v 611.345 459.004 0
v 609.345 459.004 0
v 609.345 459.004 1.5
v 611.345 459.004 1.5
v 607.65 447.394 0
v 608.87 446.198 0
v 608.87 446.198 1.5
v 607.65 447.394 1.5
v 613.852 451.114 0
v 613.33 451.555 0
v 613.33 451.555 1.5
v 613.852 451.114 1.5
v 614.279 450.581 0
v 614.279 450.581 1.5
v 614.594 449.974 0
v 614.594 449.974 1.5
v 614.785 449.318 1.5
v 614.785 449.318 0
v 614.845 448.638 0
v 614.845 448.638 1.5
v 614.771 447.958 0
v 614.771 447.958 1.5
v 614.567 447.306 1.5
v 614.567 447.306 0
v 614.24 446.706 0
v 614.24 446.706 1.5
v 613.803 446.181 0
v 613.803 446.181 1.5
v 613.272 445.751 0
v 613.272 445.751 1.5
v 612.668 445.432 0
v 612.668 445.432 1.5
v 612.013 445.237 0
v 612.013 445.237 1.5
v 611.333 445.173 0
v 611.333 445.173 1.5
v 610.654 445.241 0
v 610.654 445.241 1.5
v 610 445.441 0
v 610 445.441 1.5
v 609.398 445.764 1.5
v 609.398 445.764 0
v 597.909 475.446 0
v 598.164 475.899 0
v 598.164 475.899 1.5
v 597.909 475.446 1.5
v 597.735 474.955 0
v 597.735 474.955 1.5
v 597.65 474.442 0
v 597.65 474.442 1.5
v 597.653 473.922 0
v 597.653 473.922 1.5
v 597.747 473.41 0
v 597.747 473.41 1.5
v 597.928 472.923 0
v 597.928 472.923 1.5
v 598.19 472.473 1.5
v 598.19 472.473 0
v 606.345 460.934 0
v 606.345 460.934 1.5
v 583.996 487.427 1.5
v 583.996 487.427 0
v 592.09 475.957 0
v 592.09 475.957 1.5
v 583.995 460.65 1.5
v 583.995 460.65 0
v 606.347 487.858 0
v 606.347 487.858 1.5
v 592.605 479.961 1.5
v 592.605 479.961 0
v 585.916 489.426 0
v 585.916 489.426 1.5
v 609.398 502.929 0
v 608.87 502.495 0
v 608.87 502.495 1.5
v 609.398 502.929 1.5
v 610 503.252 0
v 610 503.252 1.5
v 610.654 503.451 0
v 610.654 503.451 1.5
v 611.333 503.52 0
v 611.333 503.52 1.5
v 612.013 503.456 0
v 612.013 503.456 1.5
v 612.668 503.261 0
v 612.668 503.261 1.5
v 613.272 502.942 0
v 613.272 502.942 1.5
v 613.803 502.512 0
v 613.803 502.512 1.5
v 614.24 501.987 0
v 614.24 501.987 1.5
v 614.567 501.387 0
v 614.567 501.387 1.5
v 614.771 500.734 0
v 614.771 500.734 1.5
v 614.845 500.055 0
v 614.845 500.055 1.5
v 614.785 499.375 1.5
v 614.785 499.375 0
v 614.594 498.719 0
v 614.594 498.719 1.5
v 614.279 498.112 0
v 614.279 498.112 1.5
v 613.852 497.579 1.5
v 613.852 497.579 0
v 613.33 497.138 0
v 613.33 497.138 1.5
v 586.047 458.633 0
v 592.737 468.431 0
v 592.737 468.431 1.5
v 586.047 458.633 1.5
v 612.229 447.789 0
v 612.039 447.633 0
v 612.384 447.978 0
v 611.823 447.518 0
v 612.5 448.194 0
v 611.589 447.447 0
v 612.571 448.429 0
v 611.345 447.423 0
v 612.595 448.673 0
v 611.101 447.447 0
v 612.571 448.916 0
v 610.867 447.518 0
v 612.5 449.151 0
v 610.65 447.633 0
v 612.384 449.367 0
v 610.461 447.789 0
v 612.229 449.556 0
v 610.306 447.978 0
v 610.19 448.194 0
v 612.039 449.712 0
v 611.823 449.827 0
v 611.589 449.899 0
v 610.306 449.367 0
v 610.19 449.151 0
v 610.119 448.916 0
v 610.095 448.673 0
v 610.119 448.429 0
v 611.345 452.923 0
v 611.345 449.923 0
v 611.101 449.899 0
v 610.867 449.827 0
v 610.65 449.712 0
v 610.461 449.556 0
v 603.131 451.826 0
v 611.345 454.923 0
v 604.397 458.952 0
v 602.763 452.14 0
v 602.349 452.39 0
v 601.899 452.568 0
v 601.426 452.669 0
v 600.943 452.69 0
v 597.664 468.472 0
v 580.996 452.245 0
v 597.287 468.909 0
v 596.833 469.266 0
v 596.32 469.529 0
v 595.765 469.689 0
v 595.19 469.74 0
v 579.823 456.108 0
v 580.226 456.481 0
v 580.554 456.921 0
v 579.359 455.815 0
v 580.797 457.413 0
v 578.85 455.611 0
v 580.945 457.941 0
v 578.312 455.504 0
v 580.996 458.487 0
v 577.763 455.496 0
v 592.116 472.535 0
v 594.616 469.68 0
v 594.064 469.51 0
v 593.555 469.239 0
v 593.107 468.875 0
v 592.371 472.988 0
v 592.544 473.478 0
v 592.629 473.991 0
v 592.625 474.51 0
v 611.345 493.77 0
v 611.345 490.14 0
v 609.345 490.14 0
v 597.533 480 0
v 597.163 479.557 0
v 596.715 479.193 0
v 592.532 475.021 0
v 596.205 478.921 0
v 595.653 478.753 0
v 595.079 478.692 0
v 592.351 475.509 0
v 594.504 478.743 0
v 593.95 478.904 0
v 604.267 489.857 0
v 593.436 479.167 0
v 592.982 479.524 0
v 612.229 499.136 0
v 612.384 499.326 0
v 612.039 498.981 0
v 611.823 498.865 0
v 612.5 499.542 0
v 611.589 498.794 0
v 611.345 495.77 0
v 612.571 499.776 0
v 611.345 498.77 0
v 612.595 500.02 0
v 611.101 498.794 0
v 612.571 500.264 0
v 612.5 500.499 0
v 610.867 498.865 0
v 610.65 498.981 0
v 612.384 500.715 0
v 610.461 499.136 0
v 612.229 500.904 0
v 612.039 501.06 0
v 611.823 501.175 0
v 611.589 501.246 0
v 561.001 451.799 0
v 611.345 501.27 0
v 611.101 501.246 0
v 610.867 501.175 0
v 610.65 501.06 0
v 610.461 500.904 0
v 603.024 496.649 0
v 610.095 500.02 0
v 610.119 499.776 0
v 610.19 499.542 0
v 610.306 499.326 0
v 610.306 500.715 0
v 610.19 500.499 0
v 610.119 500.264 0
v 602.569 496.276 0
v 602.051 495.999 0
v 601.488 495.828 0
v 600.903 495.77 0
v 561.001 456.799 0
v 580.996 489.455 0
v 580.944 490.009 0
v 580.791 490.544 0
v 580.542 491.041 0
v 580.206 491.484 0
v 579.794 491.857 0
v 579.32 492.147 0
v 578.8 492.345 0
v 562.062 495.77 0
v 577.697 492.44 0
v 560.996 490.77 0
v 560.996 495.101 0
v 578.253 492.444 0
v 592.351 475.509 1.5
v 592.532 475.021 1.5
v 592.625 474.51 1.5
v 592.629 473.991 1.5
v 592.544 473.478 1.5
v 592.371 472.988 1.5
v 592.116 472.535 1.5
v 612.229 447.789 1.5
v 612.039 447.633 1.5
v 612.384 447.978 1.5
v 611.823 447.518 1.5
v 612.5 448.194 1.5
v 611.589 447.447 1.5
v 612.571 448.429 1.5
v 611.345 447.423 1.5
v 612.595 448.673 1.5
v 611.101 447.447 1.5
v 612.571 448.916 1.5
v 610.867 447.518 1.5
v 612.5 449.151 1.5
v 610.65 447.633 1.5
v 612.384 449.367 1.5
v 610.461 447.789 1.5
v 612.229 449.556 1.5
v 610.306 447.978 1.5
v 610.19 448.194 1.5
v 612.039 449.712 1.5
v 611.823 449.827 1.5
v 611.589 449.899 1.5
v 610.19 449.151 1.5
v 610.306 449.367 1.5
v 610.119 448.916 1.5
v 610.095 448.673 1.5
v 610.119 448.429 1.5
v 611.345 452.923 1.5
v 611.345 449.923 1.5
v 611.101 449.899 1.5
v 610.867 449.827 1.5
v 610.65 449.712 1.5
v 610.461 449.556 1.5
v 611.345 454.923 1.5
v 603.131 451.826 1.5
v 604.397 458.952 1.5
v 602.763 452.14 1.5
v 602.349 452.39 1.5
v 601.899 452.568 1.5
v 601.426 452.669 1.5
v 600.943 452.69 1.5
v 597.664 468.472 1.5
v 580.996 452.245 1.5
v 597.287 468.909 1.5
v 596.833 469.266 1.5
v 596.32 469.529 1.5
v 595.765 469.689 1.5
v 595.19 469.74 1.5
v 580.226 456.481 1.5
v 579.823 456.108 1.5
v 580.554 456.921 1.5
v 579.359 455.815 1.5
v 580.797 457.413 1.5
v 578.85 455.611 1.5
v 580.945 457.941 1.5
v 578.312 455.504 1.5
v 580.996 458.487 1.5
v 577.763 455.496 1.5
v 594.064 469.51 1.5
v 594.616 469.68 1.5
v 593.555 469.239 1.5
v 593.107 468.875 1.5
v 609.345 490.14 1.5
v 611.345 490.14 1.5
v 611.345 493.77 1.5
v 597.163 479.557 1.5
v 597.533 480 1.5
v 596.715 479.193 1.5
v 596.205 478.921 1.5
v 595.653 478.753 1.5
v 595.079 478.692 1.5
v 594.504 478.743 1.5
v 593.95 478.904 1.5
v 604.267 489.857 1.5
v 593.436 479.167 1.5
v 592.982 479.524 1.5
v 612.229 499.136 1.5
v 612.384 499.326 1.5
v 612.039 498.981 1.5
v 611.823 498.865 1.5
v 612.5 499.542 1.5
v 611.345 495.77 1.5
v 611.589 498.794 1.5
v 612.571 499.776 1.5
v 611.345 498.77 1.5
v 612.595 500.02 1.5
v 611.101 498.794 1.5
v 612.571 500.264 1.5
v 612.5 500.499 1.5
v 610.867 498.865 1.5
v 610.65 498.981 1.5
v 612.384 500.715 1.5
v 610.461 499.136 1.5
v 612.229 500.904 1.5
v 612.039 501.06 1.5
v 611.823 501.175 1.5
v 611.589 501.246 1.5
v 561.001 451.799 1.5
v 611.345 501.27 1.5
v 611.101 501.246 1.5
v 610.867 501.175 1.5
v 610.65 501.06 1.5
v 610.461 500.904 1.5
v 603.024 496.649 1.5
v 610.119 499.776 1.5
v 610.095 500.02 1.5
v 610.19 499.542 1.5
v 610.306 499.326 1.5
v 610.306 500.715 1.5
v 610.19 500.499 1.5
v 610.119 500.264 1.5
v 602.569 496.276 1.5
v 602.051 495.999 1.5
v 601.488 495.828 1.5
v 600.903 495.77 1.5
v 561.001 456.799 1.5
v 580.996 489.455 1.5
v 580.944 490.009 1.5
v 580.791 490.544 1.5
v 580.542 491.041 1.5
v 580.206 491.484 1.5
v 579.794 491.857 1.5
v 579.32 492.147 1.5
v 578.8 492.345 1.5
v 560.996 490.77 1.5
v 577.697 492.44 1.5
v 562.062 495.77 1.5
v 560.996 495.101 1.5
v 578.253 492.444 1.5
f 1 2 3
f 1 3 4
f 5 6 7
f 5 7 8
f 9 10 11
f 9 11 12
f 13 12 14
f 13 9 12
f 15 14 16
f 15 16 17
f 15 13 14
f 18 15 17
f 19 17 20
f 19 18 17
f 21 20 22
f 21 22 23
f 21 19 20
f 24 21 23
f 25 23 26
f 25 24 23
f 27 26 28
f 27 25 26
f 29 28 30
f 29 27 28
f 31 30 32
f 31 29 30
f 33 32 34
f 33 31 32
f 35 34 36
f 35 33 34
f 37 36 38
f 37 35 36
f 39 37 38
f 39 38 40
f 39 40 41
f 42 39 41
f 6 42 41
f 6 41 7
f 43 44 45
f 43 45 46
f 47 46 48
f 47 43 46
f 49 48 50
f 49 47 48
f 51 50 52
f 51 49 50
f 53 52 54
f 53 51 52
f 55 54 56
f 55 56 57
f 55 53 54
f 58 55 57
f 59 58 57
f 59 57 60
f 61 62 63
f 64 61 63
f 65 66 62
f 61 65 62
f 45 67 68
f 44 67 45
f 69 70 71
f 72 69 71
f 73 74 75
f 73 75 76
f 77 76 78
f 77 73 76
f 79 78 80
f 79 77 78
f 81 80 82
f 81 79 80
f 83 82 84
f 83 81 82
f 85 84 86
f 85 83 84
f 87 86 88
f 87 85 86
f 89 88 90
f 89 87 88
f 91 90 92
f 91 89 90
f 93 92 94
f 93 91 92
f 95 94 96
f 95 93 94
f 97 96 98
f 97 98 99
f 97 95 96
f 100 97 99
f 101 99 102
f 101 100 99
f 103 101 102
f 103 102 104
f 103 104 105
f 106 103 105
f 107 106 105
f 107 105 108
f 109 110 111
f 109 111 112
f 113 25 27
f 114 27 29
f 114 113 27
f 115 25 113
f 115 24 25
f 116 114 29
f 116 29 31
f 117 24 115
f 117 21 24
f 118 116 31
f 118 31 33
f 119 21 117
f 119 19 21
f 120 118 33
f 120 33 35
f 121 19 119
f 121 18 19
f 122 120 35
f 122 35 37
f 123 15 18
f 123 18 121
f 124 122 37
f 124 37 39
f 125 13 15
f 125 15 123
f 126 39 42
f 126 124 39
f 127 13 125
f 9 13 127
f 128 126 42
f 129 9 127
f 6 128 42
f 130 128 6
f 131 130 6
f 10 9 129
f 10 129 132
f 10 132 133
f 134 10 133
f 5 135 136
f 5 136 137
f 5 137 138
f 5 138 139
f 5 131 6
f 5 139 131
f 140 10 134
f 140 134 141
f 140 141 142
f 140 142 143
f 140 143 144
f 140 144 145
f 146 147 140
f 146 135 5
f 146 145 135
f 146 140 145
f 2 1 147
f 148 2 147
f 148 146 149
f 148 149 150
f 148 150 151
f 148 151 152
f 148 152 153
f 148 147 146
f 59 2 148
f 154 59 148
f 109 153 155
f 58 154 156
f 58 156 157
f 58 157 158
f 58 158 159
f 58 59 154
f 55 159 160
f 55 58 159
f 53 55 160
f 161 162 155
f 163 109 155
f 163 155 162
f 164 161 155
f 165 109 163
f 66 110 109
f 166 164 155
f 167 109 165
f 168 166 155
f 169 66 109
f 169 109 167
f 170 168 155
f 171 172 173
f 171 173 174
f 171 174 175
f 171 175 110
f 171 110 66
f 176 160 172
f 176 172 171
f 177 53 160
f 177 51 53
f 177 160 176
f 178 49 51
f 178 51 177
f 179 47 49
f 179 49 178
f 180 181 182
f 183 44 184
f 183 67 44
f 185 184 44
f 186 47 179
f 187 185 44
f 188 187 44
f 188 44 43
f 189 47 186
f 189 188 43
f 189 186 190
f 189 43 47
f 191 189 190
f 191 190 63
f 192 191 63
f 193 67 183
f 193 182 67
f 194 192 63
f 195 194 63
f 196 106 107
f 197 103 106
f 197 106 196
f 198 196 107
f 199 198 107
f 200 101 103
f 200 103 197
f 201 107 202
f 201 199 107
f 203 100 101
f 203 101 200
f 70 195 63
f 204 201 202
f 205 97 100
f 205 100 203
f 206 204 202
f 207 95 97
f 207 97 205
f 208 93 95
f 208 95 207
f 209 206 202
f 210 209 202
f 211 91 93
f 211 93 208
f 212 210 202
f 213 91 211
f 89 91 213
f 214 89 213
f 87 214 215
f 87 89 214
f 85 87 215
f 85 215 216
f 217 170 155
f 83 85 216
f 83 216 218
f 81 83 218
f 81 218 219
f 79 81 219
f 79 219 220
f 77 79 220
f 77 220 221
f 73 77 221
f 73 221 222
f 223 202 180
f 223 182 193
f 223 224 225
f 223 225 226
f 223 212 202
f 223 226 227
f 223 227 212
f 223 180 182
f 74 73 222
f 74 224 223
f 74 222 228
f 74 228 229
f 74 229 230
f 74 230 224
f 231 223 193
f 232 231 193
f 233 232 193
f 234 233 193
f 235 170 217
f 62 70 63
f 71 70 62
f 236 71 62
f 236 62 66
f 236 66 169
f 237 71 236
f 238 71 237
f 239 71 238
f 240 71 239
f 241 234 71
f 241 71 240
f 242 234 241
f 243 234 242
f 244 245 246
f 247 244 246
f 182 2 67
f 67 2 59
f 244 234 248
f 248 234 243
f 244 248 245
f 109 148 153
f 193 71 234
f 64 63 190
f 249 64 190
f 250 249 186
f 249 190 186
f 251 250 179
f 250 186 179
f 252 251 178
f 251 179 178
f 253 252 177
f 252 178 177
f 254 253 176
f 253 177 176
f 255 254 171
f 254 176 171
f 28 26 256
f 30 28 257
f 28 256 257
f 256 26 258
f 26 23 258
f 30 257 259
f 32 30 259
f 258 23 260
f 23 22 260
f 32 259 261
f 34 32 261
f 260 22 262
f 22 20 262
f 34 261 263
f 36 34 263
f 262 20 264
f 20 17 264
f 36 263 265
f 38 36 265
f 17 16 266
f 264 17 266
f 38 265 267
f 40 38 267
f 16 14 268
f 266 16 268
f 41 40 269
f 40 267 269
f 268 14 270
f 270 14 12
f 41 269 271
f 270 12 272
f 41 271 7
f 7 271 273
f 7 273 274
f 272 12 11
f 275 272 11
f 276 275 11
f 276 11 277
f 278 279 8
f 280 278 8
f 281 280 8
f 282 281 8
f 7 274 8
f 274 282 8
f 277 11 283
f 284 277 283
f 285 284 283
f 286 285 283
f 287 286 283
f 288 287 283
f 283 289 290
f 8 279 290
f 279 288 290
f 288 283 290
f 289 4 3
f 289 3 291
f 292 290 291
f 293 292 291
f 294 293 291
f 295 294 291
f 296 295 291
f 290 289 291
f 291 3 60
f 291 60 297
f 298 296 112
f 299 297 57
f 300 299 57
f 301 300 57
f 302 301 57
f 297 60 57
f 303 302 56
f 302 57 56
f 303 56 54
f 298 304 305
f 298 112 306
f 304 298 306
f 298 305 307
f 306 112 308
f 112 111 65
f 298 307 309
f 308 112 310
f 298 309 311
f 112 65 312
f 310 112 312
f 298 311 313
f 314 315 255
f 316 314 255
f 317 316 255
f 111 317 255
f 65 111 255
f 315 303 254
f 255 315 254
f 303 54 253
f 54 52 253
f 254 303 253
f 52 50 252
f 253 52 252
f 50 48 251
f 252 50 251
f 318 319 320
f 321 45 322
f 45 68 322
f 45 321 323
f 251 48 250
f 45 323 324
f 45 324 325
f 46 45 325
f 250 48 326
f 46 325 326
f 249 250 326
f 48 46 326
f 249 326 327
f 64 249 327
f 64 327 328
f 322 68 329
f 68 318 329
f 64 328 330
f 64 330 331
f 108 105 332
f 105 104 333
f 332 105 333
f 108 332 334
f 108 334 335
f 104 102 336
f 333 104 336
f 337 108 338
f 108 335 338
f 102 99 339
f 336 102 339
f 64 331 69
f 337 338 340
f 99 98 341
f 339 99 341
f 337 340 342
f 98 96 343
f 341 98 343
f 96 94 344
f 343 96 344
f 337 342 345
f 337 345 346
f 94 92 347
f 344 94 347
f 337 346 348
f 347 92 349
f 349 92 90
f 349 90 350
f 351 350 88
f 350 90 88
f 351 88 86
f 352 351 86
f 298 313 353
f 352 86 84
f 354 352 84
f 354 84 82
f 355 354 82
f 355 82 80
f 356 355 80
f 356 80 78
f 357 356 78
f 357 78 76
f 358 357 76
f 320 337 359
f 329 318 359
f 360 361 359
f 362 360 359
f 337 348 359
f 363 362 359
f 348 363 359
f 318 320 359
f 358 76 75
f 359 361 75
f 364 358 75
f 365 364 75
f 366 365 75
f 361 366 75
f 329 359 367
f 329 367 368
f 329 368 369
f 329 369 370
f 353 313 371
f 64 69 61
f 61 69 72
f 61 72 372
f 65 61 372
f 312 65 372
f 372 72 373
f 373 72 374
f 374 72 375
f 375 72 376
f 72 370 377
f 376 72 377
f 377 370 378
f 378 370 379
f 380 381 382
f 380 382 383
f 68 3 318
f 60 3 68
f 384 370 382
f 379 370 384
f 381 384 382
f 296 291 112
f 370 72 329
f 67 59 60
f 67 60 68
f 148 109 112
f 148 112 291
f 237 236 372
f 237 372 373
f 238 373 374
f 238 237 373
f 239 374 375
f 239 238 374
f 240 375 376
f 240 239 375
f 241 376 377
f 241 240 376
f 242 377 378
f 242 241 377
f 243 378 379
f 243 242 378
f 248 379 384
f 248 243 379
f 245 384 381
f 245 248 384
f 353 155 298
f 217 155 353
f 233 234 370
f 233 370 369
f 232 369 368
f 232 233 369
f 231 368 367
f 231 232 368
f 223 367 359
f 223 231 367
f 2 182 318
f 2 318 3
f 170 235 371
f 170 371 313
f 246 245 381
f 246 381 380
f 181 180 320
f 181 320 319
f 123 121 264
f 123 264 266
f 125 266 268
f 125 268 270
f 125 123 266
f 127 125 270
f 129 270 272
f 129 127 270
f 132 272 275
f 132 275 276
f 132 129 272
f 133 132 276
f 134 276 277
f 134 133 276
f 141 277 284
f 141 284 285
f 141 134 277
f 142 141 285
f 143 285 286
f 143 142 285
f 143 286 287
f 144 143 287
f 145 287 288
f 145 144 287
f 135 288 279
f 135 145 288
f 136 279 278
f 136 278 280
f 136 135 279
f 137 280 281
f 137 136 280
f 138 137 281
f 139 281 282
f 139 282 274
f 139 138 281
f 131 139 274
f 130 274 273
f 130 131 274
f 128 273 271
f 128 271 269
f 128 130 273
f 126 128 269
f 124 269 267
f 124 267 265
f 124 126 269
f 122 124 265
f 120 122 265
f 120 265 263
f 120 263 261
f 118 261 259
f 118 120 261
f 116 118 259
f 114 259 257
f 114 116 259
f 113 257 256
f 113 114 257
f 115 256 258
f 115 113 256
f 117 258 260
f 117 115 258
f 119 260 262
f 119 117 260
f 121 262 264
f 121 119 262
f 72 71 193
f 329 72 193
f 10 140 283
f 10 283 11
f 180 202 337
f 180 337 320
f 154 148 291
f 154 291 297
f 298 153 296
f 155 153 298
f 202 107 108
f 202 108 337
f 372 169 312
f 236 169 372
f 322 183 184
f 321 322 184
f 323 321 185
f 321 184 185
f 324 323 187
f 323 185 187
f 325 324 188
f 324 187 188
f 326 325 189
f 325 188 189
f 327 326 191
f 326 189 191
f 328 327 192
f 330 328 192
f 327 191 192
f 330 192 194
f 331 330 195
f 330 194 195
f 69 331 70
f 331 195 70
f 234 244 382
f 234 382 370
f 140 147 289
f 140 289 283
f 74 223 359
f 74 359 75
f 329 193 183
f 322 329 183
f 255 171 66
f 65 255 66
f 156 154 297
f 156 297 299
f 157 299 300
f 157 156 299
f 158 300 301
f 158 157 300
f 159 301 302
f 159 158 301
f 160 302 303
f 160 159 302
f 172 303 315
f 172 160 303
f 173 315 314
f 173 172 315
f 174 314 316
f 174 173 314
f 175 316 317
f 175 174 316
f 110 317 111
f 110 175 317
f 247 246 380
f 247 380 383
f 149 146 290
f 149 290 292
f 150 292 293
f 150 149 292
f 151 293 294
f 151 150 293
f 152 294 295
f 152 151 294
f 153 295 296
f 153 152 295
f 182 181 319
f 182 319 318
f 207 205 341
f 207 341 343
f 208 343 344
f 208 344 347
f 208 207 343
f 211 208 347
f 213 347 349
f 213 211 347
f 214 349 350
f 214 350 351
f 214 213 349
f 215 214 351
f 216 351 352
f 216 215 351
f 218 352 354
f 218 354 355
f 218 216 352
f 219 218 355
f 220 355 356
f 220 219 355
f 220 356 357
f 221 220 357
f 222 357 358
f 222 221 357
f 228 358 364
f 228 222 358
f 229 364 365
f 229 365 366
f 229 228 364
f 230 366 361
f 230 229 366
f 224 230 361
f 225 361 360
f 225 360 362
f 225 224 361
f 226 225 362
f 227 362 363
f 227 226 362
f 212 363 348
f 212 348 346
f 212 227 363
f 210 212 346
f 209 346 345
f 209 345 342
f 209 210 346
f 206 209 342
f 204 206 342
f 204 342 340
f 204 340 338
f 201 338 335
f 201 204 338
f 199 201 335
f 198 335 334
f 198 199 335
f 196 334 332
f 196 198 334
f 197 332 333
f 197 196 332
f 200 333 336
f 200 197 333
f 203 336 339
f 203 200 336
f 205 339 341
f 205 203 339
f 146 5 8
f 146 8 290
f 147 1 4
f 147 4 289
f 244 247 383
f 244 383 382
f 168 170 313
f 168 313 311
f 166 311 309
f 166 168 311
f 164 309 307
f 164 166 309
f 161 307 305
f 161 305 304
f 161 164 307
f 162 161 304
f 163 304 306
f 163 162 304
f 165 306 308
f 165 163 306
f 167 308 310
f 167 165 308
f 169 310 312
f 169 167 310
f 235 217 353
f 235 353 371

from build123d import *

# Parameters (mm, degrees)
MODEL_R         = 1.25
EXTRUDE_1_DEPTH = 1.5


with BuildPart() as part:
    # Model → 凸台-拉伸1 (new body)
    with BuildSketch(Plane.XY):
        with BuildLine():
            Line((580.995568625, 495.770292788), (600.902512418, 495.770292788))
            ThreePointArc((600.902512418, 495.770292788), (602.050562715, 495.99865419), (603.023832761, 496.648972444))
            Line((603.023832761, 496.648972444), (608.87002472, 502.495166354))
            ThreePointArc((608.87002472, 502.495166354), (614.034668548, 502.25974311), (613.330350777, 497.137936158))
            Line((613.330350777, 497.137936158), (611.344894179, 495.770295165))
            Line((611.344894179, 495.770295165), (611.344903066, 493.770295165))
            Line((611.344903066, 493.770295165), (611.344898622, 490.139940091))
            Line((611.344898622, 490.139940091), (609.344898622, 490.139940091))
            Line((609.344898622, 490.139940091), (609.344898622, 459.003527023))
            Line((609.344898622, 459.003527023), (611.344898622, 459.003527023))
            Line((611.344898622, 459.003527023), (611.344903066, 454.922529401))
            Line((611.344903066, 454.922529401), (611.344903066, 452.922529401))
            Line((611.344903066, 452.922529401), (613.330355459, 451.554880428))
            ThreePointArc((613.330355459, 451.554880428), (614.034666789, 446.433074588), (608.870024851, 446.197653326))
            Line((608.870024851, 446.197653326), (607.649614702, 447.394418416))
            Line((607.649614702, 447.394418416), (603.130826548, 451.825656479))
            ThreePointArc((603.130826548, 451.825656479), (602.127647934, 452.488182187), (600.942551931, 452.690308661))
            Line((600.942551931, 452.690308661), (580.995568625, 452.245019157))
            Line((580.995568625, 452.245019157), (561.000550217, 451.798657335))
            Line((561.000550217, 451.798657335), (561.000550217, 456.798657335))
            Line((561.000550217, 456.798657335), (577.763165347, 455.496180974))
            ThreePointArc((577.763165347, 455.496180974), (580.033065884, 456.285210752), (580.995568625, 458.487165547))
            Line((580.995568625, 458.487165547), (580.995568625, 489.455330101))
            ThreePointArc((580.995568625, 489.455330101), (580.008584587, 491.679687702), (577.697057468, 492.440441672))
            Line((577.697057468, 492.440441672), (560.995568625, 490.770292788))
            Line((560.995568625, 490.770292788), (560.995568625, 495.100850038))
            Line((560.995568625, 495.100850038), (562.062443854, 495.770292788))
            Line((562.062443854, 495.770292788), (580.995568625, 495.770292788))
        make_face()
        with Locations((611.344898622, 500.020292788)):
            Circle(MODEL_R, mode=Mode.SUBTRACT)
        with Locations((611.344898622, 448.672527023)):
            Circle(MODEL_R, mode=Mode.SUBTRACT)
        with BuildLine():
            Line((585.91647506, 489.426366255), (604.267397119, 489.857372067))
            Line((604.267397119, 489.857372067), (597.532531309, 479.99996659))
            ThreePointArc((597.532531309, 479.99996659), (595.079201685, 478.692455827), (592.605499439, 479.961001386))
            Line((592.605499439, 479.961001386), (585.91647506, 489.426366255))
        make_face(mode=Mode.SUBTRACT)
        with BuildLine():
            Line((586.047448792, 458.632826912), (604.397047311, 458.951765009))
            Line((604.397047311, 458.951765009), (597.664323818, 468.47211859))
            ThreePointArc((597.664323818, 468.47211859), (595.190191772, 469.739825644), (592.737305457, 468.431483456))
            Line((592.737305457, 468.431483456), (586.047448792, 458.632826912))
        make_face(mode=Mode.SUBTRACT)
        with BuildLine():
            Line((583.99514789, 460.649796595), (583.995526777, 487.427452126))
            Line((583.995526777, 487.427452126), (592.089795546, 475.957499013))
            ThreePointArc((592.089795546, 475.957499013), (592.638587507, 474.250490234), (592.115726369, 472.535361137))
            Line((592.115726369, 472.535361137), (583.99514789, 460.649796595))
        make_face(mode=Mode.SUBTRACT)
        with BuildLine():
            Line((606.345062591, 460.933766521), (606.346502303, 487.858246923))
            Line((606.346502303, 487.858246923), (598.164147844, 475.898832518))
            ThreePointArc((598.164147844, 475.898832518), (597.640194793, 474.182081738), (598.190130861, 472.473476938))
            Line((598.190130861, 472.473476938), (606.345062591, 460.933766521))
        make_face(mode=Mode.SUBTRACT)
    extrude(amount=EXTRUDE_1_DEPTH)


solid = part.part
